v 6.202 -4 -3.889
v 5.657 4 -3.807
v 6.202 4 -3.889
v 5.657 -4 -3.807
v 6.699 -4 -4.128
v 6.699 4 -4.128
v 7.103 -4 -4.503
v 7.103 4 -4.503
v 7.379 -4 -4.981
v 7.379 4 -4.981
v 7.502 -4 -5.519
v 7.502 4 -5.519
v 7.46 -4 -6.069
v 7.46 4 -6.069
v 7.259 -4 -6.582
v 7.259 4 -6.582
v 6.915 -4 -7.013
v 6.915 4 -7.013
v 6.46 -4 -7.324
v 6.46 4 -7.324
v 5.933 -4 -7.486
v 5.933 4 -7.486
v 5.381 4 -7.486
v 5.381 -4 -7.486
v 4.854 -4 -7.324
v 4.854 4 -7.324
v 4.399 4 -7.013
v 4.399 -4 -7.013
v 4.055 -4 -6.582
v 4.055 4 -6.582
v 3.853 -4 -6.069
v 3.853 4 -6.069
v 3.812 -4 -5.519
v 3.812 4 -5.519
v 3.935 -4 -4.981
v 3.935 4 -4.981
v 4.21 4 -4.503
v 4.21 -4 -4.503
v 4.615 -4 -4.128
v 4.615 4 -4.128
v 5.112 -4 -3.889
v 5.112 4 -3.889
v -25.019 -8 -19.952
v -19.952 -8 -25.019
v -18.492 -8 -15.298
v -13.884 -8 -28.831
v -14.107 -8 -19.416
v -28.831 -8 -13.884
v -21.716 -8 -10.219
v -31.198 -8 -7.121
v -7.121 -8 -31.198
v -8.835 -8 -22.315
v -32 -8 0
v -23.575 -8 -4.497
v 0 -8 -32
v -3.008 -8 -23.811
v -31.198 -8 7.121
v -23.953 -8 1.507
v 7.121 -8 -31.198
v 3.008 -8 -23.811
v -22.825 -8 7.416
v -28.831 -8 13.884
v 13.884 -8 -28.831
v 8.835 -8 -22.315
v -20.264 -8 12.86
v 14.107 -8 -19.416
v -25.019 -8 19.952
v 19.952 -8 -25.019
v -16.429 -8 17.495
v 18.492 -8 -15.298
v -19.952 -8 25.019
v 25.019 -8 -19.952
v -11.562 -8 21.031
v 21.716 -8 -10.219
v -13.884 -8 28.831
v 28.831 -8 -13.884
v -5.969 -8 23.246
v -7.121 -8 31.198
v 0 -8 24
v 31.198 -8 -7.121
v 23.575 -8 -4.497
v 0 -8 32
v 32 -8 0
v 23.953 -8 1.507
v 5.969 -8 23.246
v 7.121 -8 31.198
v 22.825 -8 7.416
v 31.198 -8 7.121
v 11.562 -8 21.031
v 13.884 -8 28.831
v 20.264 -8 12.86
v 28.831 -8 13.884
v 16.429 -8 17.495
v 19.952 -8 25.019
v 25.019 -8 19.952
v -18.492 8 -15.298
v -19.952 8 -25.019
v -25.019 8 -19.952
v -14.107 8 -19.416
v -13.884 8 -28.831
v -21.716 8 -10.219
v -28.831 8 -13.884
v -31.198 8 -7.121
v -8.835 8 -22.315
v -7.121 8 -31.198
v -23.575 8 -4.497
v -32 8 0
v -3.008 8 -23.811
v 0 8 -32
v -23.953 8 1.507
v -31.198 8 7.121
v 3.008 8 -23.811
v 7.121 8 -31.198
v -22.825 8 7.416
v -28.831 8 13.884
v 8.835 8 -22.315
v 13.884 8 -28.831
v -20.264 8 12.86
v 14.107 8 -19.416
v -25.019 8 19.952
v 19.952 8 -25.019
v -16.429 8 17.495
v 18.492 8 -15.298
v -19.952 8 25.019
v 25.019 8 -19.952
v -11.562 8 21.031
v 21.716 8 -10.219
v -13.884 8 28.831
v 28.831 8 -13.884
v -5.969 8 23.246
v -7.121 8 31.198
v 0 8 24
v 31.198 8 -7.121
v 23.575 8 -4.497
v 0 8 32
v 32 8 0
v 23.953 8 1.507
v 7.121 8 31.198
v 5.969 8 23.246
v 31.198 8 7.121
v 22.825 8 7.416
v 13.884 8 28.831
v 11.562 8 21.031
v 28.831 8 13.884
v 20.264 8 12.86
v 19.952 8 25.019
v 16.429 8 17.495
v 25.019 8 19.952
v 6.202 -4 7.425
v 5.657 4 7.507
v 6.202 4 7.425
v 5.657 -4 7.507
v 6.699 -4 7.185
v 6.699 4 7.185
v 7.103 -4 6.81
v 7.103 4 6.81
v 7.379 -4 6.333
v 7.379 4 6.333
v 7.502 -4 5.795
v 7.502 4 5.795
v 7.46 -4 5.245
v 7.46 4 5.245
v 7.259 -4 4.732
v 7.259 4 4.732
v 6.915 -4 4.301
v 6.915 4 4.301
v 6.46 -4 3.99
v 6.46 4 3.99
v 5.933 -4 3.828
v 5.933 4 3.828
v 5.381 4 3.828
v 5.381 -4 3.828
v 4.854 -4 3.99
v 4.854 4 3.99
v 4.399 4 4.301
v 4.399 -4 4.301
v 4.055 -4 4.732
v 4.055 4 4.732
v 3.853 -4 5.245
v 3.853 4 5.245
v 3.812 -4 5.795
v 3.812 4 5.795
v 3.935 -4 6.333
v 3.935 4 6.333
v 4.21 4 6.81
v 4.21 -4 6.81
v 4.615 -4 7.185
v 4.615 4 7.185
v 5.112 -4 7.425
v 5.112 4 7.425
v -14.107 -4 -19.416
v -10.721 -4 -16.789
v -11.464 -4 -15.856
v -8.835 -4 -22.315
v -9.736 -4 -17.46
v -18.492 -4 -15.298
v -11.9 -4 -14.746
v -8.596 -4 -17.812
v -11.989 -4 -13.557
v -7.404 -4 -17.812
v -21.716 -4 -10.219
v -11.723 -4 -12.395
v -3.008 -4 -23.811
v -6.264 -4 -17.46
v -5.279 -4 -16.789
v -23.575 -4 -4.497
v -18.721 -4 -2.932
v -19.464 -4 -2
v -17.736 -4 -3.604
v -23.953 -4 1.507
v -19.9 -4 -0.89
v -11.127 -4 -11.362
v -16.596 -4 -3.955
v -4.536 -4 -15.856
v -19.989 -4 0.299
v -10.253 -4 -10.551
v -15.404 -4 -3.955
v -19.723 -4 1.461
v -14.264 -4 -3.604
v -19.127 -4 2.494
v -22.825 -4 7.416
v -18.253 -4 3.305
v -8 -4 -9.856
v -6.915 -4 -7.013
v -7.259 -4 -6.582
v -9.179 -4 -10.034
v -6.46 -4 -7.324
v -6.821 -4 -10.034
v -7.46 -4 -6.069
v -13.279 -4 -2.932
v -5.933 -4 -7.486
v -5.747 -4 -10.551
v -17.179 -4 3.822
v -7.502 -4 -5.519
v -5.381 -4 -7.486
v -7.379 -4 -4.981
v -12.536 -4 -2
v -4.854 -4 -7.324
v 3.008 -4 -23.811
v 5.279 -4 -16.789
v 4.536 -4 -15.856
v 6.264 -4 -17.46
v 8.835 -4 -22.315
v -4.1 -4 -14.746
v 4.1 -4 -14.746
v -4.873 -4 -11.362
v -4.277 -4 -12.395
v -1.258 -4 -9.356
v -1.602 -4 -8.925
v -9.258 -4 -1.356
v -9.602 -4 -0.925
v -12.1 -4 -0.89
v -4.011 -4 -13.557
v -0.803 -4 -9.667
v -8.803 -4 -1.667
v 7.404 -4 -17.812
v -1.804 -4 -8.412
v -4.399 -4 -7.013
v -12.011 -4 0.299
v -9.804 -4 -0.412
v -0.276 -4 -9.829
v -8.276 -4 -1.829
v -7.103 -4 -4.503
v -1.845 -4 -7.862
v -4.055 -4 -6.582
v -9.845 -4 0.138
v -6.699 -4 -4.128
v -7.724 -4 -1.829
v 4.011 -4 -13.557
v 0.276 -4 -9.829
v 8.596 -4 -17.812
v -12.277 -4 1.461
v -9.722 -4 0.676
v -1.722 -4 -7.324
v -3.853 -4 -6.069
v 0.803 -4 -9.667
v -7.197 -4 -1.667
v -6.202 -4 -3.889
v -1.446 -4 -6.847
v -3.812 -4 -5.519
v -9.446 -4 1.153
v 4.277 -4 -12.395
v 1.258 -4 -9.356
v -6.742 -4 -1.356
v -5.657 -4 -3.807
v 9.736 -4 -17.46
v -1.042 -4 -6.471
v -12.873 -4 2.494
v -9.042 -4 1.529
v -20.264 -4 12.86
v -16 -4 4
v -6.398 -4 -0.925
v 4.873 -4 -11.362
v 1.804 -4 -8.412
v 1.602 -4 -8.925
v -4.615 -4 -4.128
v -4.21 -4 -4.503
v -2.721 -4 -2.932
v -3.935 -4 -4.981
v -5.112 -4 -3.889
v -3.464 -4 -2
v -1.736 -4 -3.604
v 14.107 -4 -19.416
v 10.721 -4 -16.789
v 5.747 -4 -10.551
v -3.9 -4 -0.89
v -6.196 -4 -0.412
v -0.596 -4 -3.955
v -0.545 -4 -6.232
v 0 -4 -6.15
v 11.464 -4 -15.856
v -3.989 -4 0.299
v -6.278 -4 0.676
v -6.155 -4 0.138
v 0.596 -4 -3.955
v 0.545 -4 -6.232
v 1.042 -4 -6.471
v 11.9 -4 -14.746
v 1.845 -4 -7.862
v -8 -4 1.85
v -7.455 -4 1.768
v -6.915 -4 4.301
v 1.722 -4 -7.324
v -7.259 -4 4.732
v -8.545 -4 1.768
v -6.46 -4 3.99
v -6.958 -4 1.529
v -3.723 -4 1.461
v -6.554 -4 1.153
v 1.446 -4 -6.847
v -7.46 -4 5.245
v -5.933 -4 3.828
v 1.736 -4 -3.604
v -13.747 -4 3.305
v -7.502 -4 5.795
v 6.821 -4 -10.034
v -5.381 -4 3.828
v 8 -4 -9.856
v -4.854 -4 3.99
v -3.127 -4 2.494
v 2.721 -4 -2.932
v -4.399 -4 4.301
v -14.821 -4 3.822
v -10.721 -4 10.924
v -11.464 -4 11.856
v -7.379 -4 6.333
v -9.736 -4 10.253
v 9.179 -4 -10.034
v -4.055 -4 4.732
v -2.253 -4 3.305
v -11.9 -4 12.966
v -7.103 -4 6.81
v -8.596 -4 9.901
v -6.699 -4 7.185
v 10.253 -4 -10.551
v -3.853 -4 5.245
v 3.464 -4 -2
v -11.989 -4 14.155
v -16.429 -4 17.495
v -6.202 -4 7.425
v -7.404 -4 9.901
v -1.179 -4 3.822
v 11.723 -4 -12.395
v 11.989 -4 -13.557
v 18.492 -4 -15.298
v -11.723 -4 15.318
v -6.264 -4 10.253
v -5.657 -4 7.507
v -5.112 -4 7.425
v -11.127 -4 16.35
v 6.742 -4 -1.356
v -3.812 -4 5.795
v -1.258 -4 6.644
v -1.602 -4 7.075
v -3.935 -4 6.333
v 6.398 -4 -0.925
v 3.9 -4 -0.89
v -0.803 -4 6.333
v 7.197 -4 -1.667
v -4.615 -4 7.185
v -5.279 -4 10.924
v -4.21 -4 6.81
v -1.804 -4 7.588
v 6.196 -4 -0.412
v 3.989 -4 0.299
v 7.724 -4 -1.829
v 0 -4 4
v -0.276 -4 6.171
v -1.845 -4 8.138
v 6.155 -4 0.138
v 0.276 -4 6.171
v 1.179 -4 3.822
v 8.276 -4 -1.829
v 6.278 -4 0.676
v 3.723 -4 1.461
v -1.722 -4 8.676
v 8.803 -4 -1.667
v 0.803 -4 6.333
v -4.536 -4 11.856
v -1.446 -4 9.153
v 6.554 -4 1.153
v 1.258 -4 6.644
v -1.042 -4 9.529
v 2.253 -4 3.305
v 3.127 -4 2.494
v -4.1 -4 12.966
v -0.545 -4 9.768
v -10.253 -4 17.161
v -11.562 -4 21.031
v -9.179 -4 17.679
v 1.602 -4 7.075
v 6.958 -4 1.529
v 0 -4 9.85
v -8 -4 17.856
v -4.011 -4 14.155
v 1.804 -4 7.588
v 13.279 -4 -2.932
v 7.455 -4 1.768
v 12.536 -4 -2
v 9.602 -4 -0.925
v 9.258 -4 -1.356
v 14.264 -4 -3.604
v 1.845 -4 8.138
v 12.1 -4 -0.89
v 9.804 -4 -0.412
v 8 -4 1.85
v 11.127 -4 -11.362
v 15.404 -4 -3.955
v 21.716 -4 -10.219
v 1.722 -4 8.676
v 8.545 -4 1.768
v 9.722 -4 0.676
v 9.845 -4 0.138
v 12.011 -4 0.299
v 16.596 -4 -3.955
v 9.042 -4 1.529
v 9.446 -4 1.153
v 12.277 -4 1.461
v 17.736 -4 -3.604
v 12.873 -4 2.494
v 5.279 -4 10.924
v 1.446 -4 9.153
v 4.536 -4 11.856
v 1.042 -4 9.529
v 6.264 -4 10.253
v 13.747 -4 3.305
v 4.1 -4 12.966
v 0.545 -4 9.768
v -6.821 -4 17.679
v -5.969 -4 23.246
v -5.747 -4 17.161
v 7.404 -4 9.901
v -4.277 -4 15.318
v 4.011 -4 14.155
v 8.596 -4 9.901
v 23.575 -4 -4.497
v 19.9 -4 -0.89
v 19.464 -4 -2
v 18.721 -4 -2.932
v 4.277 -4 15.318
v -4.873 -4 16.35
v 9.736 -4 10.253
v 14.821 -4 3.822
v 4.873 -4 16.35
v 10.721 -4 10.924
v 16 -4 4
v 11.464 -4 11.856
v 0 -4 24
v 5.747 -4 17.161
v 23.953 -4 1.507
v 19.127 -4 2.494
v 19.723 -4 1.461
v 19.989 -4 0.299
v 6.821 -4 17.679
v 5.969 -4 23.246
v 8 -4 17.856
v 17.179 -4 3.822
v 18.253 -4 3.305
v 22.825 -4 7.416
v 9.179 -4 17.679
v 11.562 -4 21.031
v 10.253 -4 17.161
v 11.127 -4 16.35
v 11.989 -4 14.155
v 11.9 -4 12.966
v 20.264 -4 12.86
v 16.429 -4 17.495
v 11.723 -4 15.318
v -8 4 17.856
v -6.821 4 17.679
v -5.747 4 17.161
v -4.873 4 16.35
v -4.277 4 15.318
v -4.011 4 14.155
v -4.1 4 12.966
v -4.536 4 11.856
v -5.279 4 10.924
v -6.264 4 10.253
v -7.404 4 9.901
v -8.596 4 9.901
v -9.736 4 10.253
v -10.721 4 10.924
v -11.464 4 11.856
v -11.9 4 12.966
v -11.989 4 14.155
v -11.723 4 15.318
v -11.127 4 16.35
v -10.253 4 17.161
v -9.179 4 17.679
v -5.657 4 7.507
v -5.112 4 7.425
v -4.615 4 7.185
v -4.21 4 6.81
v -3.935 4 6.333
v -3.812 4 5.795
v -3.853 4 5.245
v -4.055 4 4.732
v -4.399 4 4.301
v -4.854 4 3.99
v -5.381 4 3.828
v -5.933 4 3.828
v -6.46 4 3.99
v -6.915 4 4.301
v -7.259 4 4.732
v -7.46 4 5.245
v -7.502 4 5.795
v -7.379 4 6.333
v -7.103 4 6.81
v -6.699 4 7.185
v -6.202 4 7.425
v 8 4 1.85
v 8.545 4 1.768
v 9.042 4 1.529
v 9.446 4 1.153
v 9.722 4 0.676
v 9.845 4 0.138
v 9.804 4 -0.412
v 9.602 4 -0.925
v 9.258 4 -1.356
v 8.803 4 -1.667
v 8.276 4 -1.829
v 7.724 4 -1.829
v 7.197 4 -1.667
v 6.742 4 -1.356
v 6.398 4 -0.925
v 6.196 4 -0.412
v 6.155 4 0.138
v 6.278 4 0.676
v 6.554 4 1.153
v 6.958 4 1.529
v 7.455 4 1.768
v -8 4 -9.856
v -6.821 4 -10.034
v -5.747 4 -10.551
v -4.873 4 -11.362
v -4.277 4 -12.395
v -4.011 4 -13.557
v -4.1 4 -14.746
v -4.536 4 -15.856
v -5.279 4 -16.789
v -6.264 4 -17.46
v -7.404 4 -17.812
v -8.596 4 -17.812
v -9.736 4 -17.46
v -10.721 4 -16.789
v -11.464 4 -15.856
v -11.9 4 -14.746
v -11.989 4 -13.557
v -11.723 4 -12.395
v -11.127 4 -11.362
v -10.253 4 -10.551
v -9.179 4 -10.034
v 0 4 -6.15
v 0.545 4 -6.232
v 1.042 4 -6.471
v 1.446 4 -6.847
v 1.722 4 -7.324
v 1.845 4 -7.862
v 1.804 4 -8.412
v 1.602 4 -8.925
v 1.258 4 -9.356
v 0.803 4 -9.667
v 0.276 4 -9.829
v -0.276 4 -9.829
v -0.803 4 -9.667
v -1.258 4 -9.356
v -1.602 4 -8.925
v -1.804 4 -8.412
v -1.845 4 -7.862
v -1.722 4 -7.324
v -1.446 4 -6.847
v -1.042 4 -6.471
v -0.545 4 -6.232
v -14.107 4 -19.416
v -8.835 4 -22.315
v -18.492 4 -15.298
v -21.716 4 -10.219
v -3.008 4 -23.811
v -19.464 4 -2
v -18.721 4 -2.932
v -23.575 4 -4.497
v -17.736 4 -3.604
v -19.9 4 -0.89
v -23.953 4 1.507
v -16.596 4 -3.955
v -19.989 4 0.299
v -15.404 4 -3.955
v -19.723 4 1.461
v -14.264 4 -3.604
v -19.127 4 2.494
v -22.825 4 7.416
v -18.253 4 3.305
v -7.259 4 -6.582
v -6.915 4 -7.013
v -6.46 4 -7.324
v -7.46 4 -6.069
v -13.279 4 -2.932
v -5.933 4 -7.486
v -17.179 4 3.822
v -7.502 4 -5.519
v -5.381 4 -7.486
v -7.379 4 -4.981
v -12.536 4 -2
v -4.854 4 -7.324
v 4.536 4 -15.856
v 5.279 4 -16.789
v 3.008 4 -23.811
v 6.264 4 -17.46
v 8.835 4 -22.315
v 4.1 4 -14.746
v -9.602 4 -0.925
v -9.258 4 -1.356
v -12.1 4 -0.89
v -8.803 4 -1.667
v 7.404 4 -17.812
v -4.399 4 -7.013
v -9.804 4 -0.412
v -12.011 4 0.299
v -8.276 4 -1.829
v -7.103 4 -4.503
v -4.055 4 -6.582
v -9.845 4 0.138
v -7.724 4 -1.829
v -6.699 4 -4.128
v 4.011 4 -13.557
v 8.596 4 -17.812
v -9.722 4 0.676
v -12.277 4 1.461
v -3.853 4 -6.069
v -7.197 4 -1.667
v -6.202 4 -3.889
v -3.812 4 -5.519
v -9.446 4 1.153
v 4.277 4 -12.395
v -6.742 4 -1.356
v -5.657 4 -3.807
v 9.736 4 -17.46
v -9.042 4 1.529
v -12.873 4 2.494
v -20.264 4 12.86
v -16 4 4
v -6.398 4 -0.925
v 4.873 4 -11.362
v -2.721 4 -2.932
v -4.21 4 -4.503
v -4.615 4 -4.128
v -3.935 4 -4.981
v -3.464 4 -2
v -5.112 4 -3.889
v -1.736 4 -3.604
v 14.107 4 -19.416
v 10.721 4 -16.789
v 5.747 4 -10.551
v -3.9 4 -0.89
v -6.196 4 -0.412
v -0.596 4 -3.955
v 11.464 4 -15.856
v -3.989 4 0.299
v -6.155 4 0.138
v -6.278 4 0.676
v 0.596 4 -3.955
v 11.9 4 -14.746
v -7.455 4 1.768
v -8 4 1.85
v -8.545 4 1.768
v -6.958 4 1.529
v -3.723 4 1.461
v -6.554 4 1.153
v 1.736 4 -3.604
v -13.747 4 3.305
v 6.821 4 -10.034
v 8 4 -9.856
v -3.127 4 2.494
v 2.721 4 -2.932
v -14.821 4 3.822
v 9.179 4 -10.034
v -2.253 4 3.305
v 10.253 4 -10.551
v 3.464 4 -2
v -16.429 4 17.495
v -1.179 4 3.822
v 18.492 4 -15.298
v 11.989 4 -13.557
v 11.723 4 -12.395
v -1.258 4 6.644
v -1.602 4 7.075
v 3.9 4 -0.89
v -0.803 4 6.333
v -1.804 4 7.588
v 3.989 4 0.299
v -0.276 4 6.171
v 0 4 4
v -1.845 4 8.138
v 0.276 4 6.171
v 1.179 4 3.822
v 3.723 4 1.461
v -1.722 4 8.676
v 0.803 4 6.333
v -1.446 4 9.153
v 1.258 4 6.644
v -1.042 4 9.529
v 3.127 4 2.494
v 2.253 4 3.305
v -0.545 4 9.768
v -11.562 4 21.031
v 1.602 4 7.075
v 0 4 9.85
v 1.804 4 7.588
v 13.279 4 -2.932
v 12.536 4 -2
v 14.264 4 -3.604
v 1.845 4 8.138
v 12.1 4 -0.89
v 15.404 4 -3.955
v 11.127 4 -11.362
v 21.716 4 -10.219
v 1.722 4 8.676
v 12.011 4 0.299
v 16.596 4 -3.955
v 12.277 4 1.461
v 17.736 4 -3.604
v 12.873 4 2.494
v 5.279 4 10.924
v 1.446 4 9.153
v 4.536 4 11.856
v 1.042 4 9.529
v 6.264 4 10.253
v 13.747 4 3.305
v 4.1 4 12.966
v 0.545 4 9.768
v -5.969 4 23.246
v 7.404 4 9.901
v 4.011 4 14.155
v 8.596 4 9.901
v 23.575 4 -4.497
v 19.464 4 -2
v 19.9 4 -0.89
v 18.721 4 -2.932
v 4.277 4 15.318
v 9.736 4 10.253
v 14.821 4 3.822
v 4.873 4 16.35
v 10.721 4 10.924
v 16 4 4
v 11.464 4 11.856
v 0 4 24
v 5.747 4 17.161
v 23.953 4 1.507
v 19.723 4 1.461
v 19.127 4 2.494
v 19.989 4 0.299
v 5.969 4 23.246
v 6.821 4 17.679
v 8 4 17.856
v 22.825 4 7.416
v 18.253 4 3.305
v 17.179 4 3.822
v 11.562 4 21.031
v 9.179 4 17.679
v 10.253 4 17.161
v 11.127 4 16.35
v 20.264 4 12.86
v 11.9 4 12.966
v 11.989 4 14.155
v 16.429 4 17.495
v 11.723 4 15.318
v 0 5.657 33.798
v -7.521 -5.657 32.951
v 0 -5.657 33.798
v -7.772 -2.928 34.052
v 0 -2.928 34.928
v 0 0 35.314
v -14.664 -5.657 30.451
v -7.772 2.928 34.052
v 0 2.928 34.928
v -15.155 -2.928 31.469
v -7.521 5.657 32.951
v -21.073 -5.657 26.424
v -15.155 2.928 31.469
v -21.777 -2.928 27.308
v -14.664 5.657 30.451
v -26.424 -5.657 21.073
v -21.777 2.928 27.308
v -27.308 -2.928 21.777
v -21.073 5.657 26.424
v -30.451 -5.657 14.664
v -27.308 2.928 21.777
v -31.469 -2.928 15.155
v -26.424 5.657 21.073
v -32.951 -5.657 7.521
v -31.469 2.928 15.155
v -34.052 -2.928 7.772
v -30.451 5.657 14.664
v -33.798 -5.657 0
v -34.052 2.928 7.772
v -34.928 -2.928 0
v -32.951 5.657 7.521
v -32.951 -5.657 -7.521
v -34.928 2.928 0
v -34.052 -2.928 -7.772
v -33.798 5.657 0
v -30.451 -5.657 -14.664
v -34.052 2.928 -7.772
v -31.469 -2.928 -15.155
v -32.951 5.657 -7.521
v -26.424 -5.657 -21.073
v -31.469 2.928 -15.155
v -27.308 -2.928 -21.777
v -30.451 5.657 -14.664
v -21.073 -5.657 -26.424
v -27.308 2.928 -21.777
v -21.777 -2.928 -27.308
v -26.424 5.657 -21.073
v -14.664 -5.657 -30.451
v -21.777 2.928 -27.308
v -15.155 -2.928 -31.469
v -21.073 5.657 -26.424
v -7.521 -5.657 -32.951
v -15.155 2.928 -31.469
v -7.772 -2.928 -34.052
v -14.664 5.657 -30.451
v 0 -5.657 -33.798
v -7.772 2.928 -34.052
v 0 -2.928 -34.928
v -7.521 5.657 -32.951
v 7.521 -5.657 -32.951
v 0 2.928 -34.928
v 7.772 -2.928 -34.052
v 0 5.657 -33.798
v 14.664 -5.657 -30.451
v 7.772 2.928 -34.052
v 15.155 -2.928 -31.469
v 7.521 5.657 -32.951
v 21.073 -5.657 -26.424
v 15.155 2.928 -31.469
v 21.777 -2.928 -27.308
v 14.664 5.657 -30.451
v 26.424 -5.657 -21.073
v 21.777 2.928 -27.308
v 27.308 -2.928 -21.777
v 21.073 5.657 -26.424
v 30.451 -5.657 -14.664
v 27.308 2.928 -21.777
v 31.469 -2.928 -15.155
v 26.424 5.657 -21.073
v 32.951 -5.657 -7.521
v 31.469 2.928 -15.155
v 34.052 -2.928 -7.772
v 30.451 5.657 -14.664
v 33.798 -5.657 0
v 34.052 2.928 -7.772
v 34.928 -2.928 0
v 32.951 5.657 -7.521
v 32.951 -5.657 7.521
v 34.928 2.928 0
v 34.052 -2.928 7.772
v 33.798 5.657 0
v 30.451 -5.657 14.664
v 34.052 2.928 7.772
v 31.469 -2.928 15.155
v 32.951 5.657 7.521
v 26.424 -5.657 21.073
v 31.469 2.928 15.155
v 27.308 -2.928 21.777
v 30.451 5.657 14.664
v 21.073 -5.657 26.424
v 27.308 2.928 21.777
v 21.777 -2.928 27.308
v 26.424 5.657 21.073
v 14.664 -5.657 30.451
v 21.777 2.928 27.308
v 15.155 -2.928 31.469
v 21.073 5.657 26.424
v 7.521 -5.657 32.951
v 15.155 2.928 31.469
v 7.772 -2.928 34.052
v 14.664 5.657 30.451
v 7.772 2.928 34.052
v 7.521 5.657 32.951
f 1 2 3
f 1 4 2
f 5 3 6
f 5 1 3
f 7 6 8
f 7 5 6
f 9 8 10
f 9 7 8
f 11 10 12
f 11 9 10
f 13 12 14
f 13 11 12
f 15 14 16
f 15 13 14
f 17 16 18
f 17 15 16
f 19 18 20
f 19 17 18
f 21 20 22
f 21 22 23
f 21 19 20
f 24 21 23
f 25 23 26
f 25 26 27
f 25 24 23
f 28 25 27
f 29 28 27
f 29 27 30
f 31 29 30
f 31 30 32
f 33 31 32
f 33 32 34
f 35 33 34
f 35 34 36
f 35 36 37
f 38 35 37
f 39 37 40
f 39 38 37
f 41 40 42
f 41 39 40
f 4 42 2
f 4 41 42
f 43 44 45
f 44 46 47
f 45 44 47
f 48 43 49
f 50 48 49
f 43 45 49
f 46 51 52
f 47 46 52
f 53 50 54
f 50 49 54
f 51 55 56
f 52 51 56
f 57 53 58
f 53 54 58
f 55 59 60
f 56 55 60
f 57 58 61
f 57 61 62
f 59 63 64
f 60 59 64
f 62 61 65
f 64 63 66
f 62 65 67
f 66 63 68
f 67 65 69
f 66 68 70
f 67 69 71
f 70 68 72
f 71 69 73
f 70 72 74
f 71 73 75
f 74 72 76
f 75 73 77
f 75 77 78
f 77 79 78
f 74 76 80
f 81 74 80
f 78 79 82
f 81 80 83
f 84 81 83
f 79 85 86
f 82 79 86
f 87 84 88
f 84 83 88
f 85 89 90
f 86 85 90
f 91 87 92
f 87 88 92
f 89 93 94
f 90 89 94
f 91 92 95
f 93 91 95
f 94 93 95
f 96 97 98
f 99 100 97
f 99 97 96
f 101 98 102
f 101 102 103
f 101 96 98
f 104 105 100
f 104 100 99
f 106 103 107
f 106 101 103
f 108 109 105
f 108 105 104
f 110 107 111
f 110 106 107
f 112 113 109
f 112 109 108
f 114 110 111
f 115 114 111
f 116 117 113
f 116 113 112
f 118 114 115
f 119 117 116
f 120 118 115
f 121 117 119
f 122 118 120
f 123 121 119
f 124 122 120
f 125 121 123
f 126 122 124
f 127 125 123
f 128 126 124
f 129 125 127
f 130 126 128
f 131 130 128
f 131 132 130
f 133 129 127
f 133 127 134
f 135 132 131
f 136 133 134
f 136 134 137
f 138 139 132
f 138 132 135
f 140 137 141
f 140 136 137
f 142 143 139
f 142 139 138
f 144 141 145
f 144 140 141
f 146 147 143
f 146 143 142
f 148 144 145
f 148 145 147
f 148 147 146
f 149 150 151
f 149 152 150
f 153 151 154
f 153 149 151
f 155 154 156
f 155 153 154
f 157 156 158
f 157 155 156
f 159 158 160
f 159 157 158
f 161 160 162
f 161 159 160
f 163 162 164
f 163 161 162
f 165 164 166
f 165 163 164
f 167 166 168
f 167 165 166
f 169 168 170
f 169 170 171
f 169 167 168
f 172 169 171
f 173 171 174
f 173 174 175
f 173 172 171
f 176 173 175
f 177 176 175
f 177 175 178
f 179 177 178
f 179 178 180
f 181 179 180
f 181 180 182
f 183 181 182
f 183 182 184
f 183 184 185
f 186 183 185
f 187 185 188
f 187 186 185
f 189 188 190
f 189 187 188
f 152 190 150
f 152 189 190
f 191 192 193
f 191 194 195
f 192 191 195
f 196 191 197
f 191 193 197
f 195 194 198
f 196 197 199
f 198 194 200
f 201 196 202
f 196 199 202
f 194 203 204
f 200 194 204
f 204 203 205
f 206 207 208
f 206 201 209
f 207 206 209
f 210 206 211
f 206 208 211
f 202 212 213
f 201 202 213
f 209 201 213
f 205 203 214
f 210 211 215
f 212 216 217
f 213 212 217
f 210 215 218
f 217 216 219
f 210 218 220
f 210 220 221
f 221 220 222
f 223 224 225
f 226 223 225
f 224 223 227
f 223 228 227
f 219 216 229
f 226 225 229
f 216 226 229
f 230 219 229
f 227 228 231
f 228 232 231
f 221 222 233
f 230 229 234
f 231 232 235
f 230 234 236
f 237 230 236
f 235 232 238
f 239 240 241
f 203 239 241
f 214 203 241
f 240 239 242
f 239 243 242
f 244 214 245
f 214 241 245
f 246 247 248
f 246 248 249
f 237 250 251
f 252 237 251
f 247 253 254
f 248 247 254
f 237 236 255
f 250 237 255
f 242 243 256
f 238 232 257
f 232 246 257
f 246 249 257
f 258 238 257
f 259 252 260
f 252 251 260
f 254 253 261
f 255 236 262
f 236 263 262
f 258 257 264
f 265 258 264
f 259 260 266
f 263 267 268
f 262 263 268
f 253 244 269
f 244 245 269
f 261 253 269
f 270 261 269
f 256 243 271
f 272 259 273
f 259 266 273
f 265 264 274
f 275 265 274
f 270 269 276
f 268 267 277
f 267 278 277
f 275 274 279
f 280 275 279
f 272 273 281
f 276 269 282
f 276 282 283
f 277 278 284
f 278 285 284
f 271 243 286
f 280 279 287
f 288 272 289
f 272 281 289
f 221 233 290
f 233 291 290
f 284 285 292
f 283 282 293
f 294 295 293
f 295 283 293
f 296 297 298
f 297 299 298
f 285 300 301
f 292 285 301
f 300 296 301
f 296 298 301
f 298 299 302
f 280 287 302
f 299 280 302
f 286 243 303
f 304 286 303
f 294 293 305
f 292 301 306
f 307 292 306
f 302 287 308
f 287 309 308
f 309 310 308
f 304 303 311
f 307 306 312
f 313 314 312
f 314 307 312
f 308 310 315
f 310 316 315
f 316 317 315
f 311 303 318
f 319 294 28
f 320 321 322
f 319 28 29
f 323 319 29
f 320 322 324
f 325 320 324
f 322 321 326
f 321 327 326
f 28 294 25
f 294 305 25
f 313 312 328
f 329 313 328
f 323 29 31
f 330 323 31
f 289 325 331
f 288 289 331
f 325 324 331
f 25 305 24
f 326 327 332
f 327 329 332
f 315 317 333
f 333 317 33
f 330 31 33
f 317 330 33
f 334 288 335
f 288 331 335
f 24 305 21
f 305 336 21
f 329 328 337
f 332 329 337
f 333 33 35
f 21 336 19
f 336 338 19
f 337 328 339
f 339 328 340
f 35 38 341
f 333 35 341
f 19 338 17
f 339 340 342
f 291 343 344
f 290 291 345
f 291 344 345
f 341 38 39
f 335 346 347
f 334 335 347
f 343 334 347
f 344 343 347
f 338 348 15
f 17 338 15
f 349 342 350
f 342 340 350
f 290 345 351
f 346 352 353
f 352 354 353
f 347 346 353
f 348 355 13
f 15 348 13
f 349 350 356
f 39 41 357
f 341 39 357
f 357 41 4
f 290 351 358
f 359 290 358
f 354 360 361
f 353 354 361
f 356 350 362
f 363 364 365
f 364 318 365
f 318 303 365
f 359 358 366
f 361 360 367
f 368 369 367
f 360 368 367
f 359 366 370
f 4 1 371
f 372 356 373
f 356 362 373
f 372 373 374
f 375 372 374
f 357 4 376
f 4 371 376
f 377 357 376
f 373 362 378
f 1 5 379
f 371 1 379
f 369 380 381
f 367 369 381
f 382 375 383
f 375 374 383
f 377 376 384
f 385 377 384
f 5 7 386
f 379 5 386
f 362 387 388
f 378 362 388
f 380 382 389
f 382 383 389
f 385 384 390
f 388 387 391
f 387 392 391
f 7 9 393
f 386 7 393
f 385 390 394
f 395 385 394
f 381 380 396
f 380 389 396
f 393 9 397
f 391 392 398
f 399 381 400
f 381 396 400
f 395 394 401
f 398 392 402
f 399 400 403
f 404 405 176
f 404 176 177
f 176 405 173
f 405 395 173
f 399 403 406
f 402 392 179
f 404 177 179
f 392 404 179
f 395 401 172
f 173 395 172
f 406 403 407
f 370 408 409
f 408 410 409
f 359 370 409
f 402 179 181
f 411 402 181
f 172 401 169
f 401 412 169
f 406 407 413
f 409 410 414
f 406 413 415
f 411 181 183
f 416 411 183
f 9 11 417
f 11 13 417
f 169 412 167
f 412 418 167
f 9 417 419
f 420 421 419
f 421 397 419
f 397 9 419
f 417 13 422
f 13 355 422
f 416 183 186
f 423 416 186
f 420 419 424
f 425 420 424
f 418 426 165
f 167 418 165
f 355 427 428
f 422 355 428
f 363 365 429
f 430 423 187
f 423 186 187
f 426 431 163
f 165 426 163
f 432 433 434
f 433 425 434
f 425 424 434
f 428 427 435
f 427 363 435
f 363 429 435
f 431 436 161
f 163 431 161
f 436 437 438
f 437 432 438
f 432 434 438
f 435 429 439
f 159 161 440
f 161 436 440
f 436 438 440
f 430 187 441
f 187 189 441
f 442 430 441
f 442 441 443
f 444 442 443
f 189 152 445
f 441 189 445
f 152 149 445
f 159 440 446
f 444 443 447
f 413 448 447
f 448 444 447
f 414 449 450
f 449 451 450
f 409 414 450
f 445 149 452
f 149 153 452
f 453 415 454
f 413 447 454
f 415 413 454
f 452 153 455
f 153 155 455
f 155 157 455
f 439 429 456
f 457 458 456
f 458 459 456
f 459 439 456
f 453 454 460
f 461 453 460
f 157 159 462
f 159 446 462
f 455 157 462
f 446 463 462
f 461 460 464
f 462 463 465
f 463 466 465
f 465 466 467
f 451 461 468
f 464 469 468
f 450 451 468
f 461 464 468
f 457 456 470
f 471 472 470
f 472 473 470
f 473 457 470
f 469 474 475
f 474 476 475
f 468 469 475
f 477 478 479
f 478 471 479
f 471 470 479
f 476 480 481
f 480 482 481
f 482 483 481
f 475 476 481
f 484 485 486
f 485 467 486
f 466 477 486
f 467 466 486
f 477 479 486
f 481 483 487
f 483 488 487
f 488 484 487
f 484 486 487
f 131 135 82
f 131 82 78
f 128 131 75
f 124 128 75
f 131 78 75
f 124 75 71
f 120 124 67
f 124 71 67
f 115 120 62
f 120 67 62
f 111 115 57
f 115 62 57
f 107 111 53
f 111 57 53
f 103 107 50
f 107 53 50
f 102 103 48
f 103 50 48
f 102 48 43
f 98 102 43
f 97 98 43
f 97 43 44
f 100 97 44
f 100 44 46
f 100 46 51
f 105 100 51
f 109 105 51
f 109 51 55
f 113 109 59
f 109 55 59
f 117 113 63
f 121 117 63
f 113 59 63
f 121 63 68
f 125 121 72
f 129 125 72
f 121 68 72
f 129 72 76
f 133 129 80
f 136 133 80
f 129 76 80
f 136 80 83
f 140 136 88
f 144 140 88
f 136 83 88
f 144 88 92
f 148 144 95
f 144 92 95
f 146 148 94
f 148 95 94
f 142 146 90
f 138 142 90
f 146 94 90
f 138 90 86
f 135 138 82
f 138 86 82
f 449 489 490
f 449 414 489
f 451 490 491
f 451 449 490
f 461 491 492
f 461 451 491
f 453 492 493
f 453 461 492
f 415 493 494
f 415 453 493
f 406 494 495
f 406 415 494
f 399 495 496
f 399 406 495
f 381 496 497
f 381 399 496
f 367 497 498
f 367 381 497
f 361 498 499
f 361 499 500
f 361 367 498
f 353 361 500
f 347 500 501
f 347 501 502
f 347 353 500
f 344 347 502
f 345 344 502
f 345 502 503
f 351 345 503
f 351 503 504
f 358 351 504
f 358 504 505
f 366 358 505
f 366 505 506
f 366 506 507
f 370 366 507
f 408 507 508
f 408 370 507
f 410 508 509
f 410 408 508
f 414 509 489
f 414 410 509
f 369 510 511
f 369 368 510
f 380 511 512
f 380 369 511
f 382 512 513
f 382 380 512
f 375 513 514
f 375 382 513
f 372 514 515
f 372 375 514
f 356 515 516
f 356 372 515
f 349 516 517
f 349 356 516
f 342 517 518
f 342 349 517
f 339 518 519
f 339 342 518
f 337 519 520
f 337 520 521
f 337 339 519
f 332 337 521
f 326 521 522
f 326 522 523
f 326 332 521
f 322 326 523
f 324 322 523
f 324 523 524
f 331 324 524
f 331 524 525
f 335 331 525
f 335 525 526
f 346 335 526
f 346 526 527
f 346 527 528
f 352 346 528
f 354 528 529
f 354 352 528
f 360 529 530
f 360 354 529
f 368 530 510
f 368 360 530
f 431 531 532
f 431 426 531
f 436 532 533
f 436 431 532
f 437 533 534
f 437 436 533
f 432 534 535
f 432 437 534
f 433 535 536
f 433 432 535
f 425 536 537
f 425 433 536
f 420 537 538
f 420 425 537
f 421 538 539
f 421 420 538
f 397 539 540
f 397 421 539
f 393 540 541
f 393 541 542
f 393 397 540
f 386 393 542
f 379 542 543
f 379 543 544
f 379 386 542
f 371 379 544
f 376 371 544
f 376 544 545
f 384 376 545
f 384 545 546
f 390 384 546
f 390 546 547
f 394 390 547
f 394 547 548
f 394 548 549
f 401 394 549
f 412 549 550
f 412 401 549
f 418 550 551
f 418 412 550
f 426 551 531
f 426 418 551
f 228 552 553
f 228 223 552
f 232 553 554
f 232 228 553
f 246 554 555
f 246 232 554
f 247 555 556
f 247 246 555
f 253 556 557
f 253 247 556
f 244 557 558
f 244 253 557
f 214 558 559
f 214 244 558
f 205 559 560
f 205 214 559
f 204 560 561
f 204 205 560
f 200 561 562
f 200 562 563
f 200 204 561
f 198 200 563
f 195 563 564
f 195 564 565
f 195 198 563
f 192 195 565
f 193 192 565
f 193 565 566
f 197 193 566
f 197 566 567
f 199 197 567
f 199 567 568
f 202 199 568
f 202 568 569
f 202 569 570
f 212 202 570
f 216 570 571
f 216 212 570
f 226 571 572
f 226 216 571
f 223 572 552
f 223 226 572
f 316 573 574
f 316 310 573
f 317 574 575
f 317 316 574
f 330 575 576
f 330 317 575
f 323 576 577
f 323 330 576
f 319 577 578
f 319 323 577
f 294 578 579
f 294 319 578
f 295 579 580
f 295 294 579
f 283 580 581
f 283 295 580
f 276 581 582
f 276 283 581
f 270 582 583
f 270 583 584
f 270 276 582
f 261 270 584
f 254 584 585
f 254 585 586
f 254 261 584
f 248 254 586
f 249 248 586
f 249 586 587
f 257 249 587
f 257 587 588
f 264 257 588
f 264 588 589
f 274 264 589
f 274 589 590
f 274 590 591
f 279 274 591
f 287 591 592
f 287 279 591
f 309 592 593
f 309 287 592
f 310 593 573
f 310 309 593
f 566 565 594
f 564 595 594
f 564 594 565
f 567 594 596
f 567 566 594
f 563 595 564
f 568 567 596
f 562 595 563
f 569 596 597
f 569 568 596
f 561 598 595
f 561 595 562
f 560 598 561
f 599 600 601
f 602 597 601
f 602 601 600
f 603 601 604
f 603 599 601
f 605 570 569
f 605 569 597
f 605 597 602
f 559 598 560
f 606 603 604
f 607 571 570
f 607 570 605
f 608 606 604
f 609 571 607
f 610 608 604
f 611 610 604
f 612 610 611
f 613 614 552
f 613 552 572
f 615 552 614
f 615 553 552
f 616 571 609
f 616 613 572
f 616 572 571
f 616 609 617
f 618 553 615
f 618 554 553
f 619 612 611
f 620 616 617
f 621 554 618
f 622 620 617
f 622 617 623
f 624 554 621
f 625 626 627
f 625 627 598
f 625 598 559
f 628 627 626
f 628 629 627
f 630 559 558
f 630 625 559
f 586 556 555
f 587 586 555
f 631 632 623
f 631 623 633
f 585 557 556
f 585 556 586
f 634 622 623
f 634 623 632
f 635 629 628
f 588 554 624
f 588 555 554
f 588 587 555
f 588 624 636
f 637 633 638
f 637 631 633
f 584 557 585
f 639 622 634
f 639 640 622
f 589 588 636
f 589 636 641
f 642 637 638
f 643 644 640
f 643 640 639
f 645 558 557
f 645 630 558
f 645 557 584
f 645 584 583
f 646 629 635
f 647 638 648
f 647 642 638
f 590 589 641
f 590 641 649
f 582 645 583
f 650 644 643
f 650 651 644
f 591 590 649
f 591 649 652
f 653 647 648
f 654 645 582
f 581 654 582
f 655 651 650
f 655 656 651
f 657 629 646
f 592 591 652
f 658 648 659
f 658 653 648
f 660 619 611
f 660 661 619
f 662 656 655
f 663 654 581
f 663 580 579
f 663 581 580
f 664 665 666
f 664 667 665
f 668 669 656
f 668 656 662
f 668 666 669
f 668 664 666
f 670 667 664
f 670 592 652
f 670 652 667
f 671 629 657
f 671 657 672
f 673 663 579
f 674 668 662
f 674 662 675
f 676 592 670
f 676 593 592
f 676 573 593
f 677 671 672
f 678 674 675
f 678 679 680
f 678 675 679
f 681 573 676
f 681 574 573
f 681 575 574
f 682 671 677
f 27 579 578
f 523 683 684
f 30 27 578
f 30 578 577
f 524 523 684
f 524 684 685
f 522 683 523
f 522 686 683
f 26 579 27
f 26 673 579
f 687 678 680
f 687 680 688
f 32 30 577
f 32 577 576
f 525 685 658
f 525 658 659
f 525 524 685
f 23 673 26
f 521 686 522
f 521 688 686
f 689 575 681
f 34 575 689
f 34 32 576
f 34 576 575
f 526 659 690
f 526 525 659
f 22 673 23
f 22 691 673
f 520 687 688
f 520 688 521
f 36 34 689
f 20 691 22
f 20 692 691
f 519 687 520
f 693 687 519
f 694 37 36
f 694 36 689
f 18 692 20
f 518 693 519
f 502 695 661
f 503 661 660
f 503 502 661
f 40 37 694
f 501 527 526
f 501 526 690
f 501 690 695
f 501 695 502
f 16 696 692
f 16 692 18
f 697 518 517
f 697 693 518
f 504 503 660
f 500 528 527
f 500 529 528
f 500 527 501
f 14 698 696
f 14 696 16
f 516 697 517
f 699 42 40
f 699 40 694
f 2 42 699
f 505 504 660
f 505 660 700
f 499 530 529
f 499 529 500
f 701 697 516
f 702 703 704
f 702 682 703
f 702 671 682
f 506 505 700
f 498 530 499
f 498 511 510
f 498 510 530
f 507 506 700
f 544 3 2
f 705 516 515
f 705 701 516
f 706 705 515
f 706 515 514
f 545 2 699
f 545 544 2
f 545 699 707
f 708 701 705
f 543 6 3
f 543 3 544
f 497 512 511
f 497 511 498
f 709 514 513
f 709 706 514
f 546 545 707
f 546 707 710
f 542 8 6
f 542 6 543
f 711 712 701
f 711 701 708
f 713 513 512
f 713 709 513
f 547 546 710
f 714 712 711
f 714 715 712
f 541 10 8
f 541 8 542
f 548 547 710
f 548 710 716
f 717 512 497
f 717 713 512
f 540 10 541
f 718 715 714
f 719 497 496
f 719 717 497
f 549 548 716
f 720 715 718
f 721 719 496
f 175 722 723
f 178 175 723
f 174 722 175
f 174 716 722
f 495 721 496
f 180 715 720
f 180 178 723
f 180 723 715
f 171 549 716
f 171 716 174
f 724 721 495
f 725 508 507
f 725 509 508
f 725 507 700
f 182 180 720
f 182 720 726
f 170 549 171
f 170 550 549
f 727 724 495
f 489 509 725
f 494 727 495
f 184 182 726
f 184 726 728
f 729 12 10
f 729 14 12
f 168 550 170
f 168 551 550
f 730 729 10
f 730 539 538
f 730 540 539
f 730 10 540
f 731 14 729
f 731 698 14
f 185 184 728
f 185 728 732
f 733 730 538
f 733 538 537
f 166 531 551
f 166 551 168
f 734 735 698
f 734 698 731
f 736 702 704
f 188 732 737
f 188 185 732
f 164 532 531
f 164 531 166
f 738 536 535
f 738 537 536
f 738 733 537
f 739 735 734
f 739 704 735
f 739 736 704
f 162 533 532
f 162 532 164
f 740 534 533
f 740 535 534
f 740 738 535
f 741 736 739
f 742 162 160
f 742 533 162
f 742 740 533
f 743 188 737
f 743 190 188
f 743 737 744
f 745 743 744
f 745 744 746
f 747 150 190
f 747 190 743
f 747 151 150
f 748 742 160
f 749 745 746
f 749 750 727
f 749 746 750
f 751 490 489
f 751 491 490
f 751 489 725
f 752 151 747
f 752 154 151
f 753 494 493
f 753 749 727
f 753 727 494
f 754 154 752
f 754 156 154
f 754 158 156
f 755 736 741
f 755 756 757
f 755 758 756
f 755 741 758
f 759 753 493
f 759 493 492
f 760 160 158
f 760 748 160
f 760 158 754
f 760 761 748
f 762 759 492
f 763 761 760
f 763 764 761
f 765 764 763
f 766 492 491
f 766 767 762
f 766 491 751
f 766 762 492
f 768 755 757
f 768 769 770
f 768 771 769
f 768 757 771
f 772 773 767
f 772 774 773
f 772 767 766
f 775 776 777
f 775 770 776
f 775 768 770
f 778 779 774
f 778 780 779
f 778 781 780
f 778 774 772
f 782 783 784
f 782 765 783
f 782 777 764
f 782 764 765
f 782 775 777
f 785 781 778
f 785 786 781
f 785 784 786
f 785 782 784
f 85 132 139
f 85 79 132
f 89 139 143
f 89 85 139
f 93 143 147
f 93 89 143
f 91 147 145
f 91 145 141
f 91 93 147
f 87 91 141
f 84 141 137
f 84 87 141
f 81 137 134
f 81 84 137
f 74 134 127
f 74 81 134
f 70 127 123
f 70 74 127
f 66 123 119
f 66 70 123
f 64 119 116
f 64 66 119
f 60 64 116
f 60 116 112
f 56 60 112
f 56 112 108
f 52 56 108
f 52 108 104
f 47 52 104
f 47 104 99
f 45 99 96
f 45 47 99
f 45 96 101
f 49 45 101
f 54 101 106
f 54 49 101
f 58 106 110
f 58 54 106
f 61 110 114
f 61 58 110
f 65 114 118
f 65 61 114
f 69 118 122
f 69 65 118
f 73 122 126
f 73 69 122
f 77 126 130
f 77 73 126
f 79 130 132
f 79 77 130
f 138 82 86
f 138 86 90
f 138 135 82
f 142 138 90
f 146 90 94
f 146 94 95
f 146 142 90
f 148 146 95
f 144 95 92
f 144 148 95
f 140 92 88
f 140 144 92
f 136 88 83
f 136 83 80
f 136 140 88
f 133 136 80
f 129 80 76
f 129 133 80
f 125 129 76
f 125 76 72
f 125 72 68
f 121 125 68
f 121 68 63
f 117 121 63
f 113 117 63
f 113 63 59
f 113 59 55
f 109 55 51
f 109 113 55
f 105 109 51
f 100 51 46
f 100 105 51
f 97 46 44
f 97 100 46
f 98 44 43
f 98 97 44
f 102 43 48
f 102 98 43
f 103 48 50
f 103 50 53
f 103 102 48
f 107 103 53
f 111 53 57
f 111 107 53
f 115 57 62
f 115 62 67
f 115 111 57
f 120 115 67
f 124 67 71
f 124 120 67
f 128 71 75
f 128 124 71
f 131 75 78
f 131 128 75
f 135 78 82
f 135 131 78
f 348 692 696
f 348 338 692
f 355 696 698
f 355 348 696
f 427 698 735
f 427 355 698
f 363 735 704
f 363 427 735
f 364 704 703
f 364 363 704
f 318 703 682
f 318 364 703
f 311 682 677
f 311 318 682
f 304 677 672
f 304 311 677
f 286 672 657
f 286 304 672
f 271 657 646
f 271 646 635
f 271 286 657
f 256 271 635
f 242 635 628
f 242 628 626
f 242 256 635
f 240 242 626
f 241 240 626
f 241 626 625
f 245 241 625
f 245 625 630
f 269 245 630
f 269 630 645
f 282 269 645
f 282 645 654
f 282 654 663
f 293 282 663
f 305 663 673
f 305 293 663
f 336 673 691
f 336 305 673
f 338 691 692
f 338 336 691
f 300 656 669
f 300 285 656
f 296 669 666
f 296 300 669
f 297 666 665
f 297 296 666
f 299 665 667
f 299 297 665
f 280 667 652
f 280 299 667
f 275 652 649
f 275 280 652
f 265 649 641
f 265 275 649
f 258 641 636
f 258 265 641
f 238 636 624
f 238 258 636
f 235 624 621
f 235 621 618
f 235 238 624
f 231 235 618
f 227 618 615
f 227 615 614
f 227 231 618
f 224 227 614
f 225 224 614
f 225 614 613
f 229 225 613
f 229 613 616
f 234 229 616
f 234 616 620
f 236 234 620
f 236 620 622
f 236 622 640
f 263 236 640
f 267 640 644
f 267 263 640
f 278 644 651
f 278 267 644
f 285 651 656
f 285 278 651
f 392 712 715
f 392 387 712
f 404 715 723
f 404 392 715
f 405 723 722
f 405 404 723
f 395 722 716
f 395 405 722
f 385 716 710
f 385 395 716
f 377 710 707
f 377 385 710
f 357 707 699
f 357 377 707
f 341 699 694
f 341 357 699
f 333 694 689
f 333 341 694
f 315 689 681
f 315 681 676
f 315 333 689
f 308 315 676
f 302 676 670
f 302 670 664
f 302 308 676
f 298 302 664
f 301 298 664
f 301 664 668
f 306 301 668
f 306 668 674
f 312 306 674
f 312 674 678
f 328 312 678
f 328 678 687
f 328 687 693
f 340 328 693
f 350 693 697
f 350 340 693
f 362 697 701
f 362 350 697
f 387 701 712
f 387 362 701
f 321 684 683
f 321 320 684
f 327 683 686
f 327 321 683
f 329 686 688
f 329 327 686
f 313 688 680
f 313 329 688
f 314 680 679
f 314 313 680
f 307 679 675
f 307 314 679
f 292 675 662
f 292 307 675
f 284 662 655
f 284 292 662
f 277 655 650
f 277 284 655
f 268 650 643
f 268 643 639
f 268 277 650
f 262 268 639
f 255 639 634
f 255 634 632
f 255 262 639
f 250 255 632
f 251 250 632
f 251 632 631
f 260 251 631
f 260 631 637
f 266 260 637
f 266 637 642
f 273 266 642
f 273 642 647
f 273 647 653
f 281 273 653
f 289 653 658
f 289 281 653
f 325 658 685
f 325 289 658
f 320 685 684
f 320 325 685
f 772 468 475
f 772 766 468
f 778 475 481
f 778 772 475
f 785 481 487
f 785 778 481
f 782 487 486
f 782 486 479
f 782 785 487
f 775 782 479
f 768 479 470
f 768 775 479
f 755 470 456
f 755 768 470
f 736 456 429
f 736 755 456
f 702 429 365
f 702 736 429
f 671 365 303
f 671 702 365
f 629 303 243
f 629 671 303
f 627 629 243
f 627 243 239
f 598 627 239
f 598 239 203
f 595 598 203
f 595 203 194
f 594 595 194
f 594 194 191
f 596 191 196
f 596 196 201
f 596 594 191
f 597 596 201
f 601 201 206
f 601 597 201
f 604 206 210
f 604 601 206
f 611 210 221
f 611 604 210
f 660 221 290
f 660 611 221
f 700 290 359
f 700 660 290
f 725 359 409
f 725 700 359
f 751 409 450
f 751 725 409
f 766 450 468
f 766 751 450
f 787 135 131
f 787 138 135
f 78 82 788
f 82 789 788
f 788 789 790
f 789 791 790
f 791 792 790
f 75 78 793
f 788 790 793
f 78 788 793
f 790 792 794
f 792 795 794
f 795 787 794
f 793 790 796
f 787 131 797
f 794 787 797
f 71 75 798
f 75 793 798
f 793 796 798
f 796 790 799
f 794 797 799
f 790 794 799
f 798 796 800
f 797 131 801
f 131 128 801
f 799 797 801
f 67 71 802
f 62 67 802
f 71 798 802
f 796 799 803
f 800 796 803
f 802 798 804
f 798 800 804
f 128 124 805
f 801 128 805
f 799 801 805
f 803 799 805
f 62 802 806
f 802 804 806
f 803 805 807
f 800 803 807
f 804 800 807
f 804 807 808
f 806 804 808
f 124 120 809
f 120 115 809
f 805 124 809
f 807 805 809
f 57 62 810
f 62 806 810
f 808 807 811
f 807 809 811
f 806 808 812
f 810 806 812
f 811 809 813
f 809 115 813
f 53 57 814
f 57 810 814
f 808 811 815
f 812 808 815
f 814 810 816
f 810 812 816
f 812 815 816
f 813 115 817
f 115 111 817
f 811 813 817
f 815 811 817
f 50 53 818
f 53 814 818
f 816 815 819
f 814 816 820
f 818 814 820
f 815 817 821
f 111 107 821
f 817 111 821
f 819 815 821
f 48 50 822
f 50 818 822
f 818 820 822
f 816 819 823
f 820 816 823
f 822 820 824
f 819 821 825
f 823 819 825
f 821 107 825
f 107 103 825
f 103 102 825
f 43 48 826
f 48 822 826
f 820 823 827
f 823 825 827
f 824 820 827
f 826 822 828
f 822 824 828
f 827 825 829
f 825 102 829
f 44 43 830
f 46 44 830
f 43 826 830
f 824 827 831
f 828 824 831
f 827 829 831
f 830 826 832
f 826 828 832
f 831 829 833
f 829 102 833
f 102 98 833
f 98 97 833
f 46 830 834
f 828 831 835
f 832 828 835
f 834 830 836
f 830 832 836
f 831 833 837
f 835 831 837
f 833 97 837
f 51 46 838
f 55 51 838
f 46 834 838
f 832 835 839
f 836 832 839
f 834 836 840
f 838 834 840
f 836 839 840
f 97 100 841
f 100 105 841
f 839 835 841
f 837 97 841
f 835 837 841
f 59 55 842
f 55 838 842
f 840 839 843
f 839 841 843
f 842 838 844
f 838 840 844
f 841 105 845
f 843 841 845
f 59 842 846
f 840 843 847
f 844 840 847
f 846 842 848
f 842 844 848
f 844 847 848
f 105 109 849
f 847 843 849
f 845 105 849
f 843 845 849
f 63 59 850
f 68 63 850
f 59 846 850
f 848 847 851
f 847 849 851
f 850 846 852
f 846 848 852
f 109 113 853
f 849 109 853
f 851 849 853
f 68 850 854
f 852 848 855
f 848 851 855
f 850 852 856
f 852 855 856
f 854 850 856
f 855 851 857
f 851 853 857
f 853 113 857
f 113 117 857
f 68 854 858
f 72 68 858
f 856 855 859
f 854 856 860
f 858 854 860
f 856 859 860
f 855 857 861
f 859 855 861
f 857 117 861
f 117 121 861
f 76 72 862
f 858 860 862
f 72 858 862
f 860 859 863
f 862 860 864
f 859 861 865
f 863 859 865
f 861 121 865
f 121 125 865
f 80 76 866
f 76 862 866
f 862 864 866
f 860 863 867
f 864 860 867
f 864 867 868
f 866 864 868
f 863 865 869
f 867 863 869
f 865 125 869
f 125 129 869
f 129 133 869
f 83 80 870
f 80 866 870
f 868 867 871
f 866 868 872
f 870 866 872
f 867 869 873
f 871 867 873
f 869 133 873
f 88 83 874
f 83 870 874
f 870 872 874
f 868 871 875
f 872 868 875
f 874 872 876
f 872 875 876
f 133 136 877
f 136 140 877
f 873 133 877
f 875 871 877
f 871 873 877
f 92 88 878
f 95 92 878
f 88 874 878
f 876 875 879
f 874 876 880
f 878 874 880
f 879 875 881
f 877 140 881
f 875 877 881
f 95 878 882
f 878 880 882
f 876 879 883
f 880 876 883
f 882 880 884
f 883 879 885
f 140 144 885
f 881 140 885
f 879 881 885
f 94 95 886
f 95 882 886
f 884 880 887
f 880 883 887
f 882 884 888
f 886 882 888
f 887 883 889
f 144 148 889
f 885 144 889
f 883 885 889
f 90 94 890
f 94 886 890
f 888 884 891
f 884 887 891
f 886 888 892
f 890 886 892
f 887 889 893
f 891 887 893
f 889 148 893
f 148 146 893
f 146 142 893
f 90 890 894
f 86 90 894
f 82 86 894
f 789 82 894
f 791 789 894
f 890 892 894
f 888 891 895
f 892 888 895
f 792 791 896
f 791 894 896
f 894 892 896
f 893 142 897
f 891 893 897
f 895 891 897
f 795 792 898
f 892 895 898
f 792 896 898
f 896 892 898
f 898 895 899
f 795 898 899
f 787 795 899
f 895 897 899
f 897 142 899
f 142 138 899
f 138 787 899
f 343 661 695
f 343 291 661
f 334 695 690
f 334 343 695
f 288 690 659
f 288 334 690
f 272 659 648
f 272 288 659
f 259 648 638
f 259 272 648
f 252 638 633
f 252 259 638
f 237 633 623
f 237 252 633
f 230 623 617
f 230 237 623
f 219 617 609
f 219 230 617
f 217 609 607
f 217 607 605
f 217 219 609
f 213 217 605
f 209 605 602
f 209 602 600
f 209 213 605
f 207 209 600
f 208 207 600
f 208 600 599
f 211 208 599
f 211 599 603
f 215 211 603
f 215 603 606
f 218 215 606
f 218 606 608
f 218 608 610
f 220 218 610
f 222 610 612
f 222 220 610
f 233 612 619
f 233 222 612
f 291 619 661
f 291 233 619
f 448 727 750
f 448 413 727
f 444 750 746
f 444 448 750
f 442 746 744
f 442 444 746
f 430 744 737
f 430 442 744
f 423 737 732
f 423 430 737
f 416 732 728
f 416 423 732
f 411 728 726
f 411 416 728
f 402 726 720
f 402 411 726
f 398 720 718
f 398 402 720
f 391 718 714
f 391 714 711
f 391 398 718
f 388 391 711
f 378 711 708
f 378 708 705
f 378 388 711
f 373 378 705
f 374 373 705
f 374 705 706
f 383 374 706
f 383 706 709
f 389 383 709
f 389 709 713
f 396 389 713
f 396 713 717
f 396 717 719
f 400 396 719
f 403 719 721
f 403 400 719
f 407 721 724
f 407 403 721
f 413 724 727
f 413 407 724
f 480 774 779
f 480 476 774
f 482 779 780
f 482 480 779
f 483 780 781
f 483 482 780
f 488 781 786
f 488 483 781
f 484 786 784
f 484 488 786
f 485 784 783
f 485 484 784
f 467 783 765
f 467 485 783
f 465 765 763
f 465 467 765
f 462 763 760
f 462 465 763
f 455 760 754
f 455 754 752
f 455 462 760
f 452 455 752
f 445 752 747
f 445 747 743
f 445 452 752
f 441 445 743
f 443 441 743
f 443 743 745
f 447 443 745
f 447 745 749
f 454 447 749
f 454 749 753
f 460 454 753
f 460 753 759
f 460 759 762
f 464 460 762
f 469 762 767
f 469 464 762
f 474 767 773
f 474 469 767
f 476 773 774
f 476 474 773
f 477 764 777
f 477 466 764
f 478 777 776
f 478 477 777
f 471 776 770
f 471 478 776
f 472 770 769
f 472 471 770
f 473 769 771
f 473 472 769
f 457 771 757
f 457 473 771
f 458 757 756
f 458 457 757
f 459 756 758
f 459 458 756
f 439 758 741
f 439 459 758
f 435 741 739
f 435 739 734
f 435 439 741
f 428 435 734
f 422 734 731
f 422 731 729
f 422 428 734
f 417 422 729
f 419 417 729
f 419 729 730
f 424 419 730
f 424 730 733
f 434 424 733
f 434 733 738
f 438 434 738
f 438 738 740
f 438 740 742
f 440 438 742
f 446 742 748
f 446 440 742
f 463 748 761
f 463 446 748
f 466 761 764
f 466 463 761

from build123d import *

# Parameters (mm, degrees)
SKETCH_1_R              = 24
SKETCH_1_R_2            = 4
SKETCH_1_R_3            = 1.85
WHEEL_HUB_TAP_DEPTH     = 4
SKETCH_1_3_R            = 32
SKETCH_1_3_R_2          = 24
WHEEL_HUB_OUTSIDE_DEPTH = 8


with BuildPart() as part:
    # 草图1 → wheel hub tap (new, symmetric)
    with BuildSketch(Plane(origin=(0, 0, 0), x_dir=(1, 0, 0), z_dir=(0, 1, 0))):
        Circle(SKETCH_1_R)
        with Locations((-8, -13.856406461)):
            Circle(SKETCH_1_R_2, mode=Mode.SUBTRACT)
        with Locations((-5.656854249, -5.656854249)):
            Circle(SKETCH_1_R_3, mode=Mode.SUBTRACT)
        with Locations((0, -8)):
            Circle(SKETCH_1_R_3, mode=Mode.SUBTRACT)
        with Locations((8, -13.856406461)):
            Circle(SKETCH_1_R_2, mode=Mode.SUBTRACT)
        with Locations((5.656854249, -5.656854249)):
            Circle(SKETCH_1_R_3, mode=Mode.SUBTRACT)
        with Locations((-16, 0)):
            Circle(SKETCH_1_R_2, mode=Mode.SUBTRACT)
        with Locations((-8, 0)):
            Circle(SKETCH_1_R_3, mode=Mode.SUBTRACT)
        with Locations((-5.656854249, 5.656854249)):
            Circle(SKETCH_1_R_3, mode=Mode.SUBTRACT)
        with Locations((-8, 13.856406461)):
            Circle(SKETCH_1_R_2, mode=Mode.SUBTRACT)
        Circle(SKETCH_1_R_2, mode=Mode.SUBTRACT)
        with Locations((5.656854249, 5.656854249)):
            Circle(SKETCH_1_R_3, mode=Mode.SUBTRACT)
        with Locations((8, 0)):
            Circle(SKETCH_1_R_3, mode=Mode.SUBTRACT)
        with Locations((0, 8)):
            Circle(SKETCH_1_R_3, mode=Mode.SUBTRACT)
        with Locations((8, 13.856406461)):
            Circle(SKETCH_1_R_2, mode=Mode.SUBTRACT)
        with Locations((16, 0)):
            Circle(SKETCH_1_R_2, mode=Mode.SUBTRACT)
    extrude(amount=WHEEL_HUB_TAP_DEPTH, both=True)


with BuildPart() as body_2:
    # 草图1<3> → wheel hub outside (new, symmetric)
    with BuildSketch(Plane(origin=(0, 0, 0), x_dir=(1, 0, 0), z_dir=(0, 1, 0))):
        Circle(SKETCH_1_3_R)
        Circle(SKETCH_1_3_R_2, mode=Mode.SUBTRACT)
    extrude(amount=WHEEL_HUB_OUTSIDE_DEPTH, both=True)


with BuildPart() as body_3:
    # 草图2 → rubber tyre (revolve)
    with BuildSketch(Plane(origin=(0, 0, 0), x_dir=(0, 0, -1), z_dir=(1, 0, 0))):
        with BuildLine():
            Line((32, 8), (32, -8))
            ThreePointArc((32, -8), (35.313708499, 0), (32, 8))
        make_face()
    revolve(axis=Axis((0, 67.110243395, 0), (0, -1, 0)))


solid = Compound([part.part, body_2.part, body_3.part])
